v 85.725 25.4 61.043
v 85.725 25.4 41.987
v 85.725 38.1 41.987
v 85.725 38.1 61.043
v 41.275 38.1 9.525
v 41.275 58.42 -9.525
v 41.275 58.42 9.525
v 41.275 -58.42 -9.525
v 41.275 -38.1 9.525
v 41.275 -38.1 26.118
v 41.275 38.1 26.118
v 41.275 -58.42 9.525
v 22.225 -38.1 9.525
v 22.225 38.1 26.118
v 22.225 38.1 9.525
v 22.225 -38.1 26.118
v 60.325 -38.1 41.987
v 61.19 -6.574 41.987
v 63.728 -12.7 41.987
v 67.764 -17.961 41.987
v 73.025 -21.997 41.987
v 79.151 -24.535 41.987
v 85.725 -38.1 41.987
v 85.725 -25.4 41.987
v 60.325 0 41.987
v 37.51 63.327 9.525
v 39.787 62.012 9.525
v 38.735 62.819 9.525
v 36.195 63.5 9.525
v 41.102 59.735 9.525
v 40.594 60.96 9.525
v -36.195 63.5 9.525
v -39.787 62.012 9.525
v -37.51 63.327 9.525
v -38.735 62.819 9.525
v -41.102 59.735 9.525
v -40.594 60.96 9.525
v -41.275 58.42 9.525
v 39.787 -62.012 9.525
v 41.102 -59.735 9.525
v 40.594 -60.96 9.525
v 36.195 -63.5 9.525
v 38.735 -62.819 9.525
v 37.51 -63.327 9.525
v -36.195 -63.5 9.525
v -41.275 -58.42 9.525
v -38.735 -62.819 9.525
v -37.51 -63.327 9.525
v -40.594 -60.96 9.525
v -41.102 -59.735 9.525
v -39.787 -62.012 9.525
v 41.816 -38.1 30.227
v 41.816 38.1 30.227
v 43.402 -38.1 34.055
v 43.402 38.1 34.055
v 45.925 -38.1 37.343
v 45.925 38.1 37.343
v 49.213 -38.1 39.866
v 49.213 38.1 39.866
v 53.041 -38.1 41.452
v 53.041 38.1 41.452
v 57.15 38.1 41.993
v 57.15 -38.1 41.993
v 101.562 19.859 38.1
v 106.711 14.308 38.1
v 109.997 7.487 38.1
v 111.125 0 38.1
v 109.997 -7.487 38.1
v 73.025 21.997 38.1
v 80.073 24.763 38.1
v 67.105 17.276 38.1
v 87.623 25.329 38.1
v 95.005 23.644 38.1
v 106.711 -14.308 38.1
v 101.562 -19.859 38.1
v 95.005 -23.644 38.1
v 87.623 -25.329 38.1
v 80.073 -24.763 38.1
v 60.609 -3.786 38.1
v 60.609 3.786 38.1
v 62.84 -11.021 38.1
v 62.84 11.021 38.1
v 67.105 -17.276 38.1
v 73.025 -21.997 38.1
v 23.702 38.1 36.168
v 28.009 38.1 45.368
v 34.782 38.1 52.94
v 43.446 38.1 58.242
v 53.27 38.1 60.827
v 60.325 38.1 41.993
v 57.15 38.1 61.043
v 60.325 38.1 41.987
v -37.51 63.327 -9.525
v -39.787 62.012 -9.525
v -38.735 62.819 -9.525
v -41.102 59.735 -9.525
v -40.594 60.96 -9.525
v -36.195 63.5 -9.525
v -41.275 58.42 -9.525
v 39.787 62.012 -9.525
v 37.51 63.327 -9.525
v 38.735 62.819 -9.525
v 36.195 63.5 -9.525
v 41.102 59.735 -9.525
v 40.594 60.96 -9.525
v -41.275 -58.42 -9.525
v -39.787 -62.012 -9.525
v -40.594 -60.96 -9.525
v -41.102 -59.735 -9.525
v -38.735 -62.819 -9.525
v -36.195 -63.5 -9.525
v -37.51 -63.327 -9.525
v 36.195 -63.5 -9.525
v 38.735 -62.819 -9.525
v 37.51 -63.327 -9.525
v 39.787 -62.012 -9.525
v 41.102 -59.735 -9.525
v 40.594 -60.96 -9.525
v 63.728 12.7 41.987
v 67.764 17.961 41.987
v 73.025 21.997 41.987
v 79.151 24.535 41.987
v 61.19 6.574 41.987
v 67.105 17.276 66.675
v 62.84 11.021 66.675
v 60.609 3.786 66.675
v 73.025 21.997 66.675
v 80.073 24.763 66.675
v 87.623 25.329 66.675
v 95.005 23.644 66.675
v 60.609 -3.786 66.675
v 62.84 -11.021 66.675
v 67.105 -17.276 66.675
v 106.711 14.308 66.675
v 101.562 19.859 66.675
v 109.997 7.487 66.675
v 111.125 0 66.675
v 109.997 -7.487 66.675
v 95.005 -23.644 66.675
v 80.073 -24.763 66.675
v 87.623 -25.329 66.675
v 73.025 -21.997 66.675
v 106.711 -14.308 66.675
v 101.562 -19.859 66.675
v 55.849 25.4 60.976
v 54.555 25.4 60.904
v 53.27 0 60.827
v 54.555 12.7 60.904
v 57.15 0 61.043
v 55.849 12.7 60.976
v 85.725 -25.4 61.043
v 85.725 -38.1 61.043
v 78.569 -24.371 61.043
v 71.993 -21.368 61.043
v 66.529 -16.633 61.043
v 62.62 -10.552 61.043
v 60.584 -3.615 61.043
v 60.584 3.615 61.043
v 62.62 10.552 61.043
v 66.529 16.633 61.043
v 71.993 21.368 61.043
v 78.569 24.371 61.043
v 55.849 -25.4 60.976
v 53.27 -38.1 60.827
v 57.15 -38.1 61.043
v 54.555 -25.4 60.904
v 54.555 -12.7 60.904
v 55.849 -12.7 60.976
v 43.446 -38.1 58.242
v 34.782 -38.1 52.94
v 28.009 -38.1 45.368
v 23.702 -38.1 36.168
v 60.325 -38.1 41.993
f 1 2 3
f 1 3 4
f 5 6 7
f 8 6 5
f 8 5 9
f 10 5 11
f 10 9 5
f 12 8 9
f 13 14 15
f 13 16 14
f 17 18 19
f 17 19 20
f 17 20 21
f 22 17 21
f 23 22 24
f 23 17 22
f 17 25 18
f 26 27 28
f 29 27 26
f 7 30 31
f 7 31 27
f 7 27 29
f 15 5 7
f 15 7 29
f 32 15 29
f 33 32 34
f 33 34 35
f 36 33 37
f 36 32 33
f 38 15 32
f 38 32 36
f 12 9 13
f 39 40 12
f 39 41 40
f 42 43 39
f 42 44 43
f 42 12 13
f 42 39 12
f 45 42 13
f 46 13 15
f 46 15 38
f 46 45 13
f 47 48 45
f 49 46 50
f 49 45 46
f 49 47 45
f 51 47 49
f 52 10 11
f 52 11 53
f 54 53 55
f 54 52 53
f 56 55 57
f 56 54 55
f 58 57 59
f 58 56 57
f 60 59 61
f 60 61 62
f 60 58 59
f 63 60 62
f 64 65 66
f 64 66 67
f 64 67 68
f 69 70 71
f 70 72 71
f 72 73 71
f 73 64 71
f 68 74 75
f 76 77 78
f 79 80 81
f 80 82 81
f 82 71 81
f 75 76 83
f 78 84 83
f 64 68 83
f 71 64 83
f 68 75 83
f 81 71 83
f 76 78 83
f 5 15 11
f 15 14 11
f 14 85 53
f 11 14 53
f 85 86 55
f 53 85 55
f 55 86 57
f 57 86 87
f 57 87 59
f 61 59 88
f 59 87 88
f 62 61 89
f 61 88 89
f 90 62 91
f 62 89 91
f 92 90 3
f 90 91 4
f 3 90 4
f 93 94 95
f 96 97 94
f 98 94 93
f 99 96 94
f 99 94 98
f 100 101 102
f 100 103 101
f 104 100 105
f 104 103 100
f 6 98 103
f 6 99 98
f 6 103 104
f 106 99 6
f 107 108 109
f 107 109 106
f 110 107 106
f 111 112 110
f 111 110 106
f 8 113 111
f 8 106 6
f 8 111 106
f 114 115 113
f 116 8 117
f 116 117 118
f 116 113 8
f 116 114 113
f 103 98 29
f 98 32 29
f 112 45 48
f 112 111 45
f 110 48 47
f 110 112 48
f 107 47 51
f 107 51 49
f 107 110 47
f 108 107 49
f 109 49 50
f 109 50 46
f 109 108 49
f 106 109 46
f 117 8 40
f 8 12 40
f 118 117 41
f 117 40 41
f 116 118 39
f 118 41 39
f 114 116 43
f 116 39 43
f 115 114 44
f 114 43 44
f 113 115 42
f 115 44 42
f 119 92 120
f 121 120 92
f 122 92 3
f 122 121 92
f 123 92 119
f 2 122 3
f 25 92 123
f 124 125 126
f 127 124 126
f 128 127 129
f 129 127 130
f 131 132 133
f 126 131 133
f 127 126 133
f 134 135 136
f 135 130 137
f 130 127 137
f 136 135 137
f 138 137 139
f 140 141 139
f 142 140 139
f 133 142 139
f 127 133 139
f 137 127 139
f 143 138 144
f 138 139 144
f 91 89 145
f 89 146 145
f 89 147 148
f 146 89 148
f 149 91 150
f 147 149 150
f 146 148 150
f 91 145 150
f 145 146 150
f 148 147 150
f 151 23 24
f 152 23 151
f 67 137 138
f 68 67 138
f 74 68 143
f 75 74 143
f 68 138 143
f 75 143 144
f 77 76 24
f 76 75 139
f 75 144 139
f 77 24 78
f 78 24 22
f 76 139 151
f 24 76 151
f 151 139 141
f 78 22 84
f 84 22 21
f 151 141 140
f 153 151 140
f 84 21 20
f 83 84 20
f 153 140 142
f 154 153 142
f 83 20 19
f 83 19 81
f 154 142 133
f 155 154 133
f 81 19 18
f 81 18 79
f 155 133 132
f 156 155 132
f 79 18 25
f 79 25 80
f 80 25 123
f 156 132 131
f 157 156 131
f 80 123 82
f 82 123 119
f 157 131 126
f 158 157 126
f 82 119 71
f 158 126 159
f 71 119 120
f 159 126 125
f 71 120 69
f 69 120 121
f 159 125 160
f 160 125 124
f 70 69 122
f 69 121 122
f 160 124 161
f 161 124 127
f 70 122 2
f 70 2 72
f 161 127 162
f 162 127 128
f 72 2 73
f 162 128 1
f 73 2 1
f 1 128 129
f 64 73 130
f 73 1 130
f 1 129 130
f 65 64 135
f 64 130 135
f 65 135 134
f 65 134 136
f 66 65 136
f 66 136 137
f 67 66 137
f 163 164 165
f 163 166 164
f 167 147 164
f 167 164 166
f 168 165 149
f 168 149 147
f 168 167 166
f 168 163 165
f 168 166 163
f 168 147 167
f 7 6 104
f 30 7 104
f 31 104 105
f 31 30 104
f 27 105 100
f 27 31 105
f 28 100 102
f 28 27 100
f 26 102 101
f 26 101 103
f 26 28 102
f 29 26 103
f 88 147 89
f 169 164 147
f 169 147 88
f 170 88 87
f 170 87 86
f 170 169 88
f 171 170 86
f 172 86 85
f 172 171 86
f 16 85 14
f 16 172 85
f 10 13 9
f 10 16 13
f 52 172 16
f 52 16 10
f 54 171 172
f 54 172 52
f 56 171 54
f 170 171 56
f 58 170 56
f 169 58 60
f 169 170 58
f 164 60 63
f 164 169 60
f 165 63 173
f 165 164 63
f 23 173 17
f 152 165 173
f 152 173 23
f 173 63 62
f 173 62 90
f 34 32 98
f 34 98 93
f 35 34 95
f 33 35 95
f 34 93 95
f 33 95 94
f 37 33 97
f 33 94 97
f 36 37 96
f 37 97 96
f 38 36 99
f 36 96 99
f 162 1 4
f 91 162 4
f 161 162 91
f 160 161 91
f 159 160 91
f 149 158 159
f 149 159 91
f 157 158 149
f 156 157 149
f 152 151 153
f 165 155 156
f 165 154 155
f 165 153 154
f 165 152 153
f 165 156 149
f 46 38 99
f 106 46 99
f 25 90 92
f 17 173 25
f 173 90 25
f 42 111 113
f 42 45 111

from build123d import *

# Parameters (mm, degrees)
F1_DEPTH = 63.5
F2_DEPTH = 38.1
F4_R     = 5.08
F5_R     = 5.08


with BuildPart() as f1:
    # F0 (on Front) → F1 (new body, symmetric)
    with BuildSketch(Plane.XZ):
        Polygon((-41.275, -9.525), (41.275, -9.525), (41.275, 9.525), (22.225, 9.525), (-41.275, 9.525), align=None)
    extrude(amount=F1_DEPTH, both=True)

    # F0 (on Front) → F2 (join, symmetric)
    with BuildSketch(Plane.XZ):
        with BuildLine():
            Line((22.225, 9.525), (41.275, 9.525))
            Line((41.275, 9.525), (41.275, 26.1178162626))
            ThreePointArc((41.275, 26.1178162626), (45.9246798487, 37.3431364139), (57.15, 41.9928162626))
            Line((57.15, 41.9928162626), (60.325, 41.9928162626))
            Line((60.325, 41.9928162626), (60.325, 61.0428162626))
            Line((60.325, 61.0428162626), (57.15, 61.0428162626))
            add(Edge.make_bspline(
                [(53.270143605, 60.8266384747), (54.5515105063, 60.9068312899), (55.8448088672, 60.9788851621), (57.15, 61.0428162626)],
                knots=[108.4277797835, 108.4277797835, 108.4277797835, 108.4277797835, 111.0926010924, 111.0926010924, 111.0926010924, 111.0926010924], degree=3))
            ThreePointArc((53.270143605, 60.8266384747), (31.1186764686, 49.4014117796), (22.225, 26.1178162626))
            Line((22.225, 26.1178162626), (22.225, 9.525))
        make_face()
        Polygon((60.325, 61.0428162626), (60.325, 41.9928162626), (60.325, 41.9873446226), (85.725, 41.9873446226), (85.725, 42.3024737561), (85.725, 51.9704466166), (85.725, 52.3875), (85.725, 61.0428162626), align=None)
    extrude(amount=F2_DEPTH, both=True)

    # F0 (on Front) → F3 (revolve)
    with BuildSketch(Plane.XZ):
        Polygon((85.725, 66.675), (85.725, 61.0428162626), (85.725, 52.3875), (85.725, 51.9704466166), (85.725, 42.3024737561), (85.725, 41.9873446226), (85.725, 38.1), (111.125, 38.1), (111.125, 66.675), align=None)
    revolve(axis=Axis((85.725, 0, 56.7151581313), (0, 0, -1)))

    # F4
    f4_edges = [f1.edges().sort_by_distance(p)[0] for p in [
        (41.275, -63.5, 0),
    ]]
    fillet(f4_edges, radius=F4_R)

    # F5
    f5_edges = [f1.edges().sort_by_distance(p)[0] for p in [
        (-41.275, 63.5, 0),
        (-41.275, -63.5, 0),
        (41.275, 63.5, 0),
    ]]
    fillet(f5_edges, radius=F5_R)


solid = f1.part
